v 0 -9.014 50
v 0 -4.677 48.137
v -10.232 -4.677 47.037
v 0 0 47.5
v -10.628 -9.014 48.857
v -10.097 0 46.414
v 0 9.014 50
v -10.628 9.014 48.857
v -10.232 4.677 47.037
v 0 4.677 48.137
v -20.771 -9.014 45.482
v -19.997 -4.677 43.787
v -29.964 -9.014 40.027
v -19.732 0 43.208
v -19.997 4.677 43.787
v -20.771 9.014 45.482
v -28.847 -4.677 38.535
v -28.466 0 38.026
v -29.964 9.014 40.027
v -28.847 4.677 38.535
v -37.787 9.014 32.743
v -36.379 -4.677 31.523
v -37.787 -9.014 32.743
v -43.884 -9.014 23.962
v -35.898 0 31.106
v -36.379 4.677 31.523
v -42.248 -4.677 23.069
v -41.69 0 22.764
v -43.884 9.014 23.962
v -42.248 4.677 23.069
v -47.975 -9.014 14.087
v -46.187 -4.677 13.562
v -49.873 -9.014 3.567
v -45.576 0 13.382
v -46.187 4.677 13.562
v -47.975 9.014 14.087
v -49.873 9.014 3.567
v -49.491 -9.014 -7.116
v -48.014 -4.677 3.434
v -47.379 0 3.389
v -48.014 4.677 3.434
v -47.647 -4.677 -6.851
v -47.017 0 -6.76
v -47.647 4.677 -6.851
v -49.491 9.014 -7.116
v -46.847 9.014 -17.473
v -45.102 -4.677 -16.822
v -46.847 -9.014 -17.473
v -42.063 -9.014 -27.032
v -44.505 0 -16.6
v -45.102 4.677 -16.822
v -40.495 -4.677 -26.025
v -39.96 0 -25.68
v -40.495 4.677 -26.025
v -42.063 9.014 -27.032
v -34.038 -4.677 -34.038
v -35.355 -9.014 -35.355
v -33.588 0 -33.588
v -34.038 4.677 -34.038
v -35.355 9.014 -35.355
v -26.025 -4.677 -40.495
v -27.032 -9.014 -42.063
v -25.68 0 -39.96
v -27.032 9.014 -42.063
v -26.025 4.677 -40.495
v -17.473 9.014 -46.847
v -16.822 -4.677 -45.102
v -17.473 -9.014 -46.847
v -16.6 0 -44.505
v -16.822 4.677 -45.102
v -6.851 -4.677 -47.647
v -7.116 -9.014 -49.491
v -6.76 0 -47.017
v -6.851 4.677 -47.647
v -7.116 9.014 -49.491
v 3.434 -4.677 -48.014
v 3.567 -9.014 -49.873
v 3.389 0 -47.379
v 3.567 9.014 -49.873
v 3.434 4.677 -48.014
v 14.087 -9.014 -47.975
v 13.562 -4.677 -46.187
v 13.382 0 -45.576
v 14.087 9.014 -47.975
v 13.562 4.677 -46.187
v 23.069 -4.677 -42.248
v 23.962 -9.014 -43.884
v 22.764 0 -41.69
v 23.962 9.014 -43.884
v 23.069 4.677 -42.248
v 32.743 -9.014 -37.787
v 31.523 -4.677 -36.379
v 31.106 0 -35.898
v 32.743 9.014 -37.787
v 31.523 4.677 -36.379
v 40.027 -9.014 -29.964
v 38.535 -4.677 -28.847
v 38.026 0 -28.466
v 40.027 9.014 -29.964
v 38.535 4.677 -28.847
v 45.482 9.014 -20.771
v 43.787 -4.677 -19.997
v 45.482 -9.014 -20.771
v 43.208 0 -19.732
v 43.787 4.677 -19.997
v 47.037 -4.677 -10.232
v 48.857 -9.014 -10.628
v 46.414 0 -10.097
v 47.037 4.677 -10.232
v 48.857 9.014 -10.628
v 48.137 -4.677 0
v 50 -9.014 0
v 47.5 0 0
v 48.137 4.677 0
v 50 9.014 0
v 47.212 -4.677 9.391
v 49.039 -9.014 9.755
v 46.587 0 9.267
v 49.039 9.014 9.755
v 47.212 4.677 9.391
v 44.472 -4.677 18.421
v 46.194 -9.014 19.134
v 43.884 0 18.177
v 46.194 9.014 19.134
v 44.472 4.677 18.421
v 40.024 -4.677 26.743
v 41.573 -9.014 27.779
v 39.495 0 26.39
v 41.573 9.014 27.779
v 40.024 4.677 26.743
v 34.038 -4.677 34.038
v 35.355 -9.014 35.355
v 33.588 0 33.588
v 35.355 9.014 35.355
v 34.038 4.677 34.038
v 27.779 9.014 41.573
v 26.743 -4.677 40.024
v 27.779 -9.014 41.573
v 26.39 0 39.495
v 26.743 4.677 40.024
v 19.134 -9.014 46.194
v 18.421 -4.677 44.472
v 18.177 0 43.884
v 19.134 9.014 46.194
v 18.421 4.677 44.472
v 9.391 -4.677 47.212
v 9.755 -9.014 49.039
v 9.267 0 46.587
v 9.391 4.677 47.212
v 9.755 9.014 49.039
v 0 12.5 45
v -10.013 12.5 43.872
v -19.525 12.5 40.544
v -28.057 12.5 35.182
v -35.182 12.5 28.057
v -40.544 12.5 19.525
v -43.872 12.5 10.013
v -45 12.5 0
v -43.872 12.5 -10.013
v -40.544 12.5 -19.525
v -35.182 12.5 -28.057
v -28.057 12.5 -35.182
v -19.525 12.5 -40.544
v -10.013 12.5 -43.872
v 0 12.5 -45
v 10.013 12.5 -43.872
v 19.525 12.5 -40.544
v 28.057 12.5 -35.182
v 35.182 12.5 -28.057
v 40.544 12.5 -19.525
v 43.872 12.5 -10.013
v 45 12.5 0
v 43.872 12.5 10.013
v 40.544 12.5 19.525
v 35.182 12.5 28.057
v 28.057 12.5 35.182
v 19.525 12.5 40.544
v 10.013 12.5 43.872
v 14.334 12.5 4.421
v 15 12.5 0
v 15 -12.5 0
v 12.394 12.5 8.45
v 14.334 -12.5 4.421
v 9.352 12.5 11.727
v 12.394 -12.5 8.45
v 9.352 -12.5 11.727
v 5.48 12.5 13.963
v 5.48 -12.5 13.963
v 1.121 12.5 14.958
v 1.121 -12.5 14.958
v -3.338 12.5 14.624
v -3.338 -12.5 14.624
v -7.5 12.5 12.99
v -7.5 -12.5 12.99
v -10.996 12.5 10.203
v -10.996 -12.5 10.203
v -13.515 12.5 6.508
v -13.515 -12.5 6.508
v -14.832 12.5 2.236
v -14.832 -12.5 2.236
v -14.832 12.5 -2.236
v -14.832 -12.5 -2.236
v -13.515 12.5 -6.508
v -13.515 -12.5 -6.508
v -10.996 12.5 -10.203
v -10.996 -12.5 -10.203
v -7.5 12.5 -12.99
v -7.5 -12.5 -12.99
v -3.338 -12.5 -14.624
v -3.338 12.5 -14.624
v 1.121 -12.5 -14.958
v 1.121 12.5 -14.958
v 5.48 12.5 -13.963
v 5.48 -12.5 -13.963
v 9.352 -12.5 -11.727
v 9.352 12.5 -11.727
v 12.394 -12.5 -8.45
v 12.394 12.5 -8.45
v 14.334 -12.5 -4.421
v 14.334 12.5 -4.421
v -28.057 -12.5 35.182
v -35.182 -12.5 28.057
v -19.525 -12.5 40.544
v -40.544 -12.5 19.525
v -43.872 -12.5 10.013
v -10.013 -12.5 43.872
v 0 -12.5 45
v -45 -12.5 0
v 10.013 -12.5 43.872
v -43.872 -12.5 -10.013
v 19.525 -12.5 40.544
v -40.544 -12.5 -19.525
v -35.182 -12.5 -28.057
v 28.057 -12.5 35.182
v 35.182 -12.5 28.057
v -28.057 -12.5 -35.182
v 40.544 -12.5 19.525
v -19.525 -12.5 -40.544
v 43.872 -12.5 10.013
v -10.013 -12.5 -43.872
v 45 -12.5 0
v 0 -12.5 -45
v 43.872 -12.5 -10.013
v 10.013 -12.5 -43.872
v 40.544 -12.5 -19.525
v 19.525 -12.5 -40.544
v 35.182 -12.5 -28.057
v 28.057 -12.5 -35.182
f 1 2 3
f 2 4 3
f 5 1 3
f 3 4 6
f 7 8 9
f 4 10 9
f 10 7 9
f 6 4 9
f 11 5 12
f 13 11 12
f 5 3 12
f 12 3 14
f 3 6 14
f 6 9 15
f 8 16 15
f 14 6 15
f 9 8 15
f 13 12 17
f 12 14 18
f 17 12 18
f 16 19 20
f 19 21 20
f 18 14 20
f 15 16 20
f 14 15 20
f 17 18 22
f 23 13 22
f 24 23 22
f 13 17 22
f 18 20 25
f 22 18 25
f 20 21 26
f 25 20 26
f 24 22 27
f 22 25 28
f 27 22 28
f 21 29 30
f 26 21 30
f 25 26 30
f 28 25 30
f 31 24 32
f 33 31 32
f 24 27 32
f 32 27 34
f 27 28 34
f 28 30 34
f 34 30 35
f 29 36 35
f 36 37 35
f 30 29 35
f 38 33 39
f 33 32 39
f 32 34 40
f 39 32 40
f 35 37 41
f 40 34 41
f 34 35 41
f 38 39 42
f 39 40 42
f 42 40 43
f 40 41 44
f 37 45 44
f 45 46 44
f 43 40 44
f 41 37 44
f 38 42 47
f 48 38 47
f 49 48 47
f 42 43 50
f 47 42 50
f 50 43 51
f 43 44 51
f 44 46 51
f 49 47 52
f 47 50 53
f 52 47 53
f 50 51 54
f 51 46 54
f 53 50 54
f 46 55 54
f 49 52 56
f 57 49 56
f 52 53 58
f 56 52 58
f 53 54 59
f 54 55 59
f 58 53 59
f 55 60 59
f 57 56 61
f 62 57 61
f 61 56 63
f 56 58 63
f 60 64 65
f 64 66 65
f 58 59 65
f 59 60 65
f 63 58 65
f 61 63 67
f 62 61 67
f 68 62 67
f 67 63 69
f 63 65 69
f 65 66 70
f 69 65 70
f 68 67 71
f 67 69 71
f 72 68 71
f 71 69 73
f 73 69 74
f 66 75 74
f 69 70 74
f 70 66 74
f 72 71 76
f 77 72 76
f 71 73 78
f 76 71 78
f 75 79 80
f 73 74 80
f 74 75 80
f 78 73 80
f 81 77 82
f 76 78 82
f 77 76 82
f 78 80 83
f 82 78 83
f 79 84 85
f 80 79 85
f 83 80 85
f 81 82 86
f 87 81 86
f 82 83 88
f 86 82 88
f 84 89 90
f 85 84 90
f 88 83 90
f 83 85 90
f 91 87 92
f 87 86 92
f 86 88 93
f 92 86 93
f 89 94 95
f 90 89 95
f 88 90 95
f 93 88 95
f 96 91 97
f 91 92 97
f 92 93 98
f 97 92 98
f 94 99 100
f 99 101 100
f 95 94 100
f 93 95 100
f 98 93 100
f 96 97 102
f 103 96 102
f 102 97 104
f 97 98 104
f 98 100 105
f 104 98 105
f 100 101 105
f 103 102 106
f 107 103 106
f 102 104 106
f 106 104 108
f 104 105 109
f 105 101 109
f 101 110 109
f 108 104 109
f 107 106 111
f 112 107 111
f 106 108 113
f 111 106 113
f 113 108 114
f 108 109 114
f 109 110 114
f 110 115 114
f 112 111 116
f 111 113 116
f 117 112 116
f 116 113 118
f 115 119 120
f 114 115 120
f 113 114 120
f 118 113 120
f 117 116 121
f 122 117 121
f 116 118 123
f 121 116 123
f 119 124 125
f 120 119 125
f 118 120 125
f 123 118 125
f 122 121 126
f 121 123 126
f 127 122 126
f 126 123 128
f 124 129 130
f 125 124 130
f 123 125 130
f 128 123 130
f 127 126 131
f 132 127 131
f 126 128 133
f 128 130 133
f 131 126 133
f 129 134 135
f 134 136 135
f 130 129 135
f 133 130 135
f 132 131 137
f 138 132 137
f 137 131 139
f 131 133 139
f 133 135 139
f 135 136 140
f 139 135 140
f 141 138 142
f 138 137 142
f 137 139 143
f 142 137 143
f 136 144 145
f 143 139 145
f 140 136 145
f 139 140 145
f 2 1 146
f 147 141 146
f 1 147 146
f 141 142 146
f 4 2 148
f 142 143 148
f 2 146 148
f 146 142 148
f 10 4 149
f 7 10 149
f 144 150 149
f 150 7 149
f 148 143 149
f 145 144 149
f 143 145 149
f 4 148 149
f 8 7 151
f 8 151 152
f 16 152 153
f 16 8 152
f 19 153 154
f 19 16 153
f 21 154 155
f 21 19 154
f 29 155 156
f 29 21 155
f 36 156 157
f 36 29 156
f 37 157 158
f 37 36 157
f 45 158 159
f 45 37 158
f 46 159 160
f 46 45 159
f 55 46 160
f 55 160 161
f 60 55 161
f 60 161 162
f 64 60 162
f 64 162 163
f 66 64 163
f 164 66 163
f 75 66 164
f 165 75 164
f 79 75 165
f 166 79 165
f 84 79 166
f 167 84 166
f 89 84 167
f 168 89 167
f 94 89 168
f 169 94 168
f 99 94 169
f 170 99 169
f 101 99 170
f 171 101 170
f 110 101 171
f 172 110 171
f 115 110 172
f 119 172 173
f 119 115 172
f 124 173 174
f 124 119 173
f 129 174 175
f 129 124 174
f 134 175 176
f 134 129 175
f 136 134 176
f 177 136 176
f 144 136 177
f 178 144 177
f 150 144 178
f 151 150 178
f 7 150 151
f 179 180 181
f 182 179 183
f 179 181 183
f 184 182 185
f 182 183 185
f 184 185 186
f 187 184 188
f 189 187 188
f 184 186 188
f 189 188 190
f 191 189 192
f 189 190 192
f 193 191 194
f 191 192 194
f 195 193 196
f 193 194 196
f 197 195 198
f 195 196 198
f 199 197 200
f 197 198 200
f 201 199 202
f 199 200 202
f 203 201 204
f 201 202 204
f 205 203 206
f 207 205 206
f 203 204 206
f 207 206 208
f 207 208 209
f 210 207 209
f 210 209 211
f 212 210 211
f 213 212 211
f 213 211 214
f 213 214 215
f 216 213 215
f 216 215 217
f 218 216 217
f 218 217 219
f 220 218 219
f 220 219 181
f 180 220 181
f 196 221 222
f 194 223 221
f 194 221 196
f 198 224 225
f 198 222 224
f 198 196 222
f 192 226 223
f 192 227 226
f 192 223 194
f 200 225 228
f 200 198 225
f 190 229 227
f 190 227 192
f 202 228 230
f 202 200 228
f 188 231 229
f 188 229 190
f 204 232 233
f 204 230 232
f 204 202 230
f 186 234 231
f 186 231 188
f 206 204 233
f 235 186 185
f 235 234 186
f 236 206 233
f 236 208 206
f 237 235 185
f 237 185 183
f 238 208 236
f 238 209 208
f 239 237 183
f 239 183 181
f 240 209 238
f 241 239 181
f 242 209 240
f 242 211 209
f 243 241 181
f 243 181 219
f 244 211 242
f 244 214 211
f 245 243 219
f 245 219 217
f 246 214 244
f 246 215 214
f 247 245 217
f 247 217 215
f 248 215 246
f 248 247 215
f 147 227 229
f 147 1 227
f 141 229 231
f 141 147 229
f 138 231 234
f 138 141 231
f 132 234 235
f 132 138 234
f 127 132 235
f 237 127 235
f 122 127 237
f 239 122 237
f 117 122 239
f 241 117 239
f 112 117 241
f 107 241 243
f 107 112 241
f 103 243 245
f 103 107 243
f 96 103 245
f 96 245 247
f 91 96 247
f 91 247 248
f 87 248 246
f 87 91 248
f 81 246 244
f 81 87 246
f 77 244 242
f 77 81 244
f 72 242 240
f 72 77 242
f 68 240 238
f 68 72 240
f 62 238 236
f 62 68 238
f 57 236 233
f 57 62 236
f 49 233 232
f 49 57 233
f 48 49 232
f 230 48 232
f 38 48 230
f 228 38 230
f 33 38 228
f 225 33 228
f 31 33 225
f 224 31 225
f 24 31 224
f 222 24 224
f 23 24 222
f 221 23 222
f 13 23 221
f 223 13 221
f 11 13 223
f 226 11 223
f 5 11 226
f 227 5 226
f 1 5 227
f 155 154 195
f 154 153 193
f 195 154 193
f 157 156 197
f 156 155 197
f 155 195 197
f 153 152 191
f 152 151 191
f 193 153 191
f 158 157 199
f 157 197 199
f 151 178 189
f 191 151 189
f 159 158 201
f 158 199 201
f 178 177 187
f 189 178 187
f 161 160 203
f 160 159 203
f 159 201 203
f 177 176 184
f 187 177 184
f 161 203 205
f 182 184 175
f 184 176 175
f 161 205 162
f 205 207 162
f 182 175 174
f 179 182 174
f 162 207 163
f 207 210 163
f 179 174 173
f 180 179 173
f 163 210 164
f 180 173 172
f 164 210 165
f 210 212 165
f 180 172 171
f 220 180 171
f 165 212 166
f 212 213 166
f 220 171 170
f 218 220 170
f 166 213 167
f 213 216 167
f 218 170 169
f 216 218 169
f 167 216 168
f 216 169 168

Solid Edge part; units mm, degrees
sketch "Sketch1" plane through (0, 0, 0) normal (0, -1, 0) x (1, 0, 0)
  circle A0 centre (0, 0) radius 50
extrude "Protrusion1" add sketch "Sketch1" along normal mid plane 25
sketch "Sketch2" plane through (0, 0, 0) normal (1, 0, 0) x (0, 1, 0)
  circle A0 centre (0, 65) radius 17.5
revolve "RevolvedCutout1" cut sketch "Sketch2" angle 360 about axis through (0, -60, 0) along (0, 1, 0)
sketch "Sketch3" plane through (0, -12.5, 0) normal (0, -1, 0) x (1, 0, 0)
  circle A0 centre (0, 0) radius 15
extrude "Cutout1" cut sketch "Sketch3" against normal up to next
sketch "Sketch4" plane through (0, 0, 0) normal (1, 0, 0) x (0, 1, 0)
  line L0 (-12.5, 45) -> (-9.0139, 50)
  dimension "D1" = 45
  dimension "D2" = 9.0139
revolve "RevolvedCutout2" cut sketch "Sketch4" angle 360 about axis through (0, -60, 0) along (0, 1, 0) material side at (0, -10.798, 47.5286)
mirror "Mirror1" about plane through (0, 0, 0) normal (0, -1, 0) of "RevolvedCutout2"
properties material "Steel"
